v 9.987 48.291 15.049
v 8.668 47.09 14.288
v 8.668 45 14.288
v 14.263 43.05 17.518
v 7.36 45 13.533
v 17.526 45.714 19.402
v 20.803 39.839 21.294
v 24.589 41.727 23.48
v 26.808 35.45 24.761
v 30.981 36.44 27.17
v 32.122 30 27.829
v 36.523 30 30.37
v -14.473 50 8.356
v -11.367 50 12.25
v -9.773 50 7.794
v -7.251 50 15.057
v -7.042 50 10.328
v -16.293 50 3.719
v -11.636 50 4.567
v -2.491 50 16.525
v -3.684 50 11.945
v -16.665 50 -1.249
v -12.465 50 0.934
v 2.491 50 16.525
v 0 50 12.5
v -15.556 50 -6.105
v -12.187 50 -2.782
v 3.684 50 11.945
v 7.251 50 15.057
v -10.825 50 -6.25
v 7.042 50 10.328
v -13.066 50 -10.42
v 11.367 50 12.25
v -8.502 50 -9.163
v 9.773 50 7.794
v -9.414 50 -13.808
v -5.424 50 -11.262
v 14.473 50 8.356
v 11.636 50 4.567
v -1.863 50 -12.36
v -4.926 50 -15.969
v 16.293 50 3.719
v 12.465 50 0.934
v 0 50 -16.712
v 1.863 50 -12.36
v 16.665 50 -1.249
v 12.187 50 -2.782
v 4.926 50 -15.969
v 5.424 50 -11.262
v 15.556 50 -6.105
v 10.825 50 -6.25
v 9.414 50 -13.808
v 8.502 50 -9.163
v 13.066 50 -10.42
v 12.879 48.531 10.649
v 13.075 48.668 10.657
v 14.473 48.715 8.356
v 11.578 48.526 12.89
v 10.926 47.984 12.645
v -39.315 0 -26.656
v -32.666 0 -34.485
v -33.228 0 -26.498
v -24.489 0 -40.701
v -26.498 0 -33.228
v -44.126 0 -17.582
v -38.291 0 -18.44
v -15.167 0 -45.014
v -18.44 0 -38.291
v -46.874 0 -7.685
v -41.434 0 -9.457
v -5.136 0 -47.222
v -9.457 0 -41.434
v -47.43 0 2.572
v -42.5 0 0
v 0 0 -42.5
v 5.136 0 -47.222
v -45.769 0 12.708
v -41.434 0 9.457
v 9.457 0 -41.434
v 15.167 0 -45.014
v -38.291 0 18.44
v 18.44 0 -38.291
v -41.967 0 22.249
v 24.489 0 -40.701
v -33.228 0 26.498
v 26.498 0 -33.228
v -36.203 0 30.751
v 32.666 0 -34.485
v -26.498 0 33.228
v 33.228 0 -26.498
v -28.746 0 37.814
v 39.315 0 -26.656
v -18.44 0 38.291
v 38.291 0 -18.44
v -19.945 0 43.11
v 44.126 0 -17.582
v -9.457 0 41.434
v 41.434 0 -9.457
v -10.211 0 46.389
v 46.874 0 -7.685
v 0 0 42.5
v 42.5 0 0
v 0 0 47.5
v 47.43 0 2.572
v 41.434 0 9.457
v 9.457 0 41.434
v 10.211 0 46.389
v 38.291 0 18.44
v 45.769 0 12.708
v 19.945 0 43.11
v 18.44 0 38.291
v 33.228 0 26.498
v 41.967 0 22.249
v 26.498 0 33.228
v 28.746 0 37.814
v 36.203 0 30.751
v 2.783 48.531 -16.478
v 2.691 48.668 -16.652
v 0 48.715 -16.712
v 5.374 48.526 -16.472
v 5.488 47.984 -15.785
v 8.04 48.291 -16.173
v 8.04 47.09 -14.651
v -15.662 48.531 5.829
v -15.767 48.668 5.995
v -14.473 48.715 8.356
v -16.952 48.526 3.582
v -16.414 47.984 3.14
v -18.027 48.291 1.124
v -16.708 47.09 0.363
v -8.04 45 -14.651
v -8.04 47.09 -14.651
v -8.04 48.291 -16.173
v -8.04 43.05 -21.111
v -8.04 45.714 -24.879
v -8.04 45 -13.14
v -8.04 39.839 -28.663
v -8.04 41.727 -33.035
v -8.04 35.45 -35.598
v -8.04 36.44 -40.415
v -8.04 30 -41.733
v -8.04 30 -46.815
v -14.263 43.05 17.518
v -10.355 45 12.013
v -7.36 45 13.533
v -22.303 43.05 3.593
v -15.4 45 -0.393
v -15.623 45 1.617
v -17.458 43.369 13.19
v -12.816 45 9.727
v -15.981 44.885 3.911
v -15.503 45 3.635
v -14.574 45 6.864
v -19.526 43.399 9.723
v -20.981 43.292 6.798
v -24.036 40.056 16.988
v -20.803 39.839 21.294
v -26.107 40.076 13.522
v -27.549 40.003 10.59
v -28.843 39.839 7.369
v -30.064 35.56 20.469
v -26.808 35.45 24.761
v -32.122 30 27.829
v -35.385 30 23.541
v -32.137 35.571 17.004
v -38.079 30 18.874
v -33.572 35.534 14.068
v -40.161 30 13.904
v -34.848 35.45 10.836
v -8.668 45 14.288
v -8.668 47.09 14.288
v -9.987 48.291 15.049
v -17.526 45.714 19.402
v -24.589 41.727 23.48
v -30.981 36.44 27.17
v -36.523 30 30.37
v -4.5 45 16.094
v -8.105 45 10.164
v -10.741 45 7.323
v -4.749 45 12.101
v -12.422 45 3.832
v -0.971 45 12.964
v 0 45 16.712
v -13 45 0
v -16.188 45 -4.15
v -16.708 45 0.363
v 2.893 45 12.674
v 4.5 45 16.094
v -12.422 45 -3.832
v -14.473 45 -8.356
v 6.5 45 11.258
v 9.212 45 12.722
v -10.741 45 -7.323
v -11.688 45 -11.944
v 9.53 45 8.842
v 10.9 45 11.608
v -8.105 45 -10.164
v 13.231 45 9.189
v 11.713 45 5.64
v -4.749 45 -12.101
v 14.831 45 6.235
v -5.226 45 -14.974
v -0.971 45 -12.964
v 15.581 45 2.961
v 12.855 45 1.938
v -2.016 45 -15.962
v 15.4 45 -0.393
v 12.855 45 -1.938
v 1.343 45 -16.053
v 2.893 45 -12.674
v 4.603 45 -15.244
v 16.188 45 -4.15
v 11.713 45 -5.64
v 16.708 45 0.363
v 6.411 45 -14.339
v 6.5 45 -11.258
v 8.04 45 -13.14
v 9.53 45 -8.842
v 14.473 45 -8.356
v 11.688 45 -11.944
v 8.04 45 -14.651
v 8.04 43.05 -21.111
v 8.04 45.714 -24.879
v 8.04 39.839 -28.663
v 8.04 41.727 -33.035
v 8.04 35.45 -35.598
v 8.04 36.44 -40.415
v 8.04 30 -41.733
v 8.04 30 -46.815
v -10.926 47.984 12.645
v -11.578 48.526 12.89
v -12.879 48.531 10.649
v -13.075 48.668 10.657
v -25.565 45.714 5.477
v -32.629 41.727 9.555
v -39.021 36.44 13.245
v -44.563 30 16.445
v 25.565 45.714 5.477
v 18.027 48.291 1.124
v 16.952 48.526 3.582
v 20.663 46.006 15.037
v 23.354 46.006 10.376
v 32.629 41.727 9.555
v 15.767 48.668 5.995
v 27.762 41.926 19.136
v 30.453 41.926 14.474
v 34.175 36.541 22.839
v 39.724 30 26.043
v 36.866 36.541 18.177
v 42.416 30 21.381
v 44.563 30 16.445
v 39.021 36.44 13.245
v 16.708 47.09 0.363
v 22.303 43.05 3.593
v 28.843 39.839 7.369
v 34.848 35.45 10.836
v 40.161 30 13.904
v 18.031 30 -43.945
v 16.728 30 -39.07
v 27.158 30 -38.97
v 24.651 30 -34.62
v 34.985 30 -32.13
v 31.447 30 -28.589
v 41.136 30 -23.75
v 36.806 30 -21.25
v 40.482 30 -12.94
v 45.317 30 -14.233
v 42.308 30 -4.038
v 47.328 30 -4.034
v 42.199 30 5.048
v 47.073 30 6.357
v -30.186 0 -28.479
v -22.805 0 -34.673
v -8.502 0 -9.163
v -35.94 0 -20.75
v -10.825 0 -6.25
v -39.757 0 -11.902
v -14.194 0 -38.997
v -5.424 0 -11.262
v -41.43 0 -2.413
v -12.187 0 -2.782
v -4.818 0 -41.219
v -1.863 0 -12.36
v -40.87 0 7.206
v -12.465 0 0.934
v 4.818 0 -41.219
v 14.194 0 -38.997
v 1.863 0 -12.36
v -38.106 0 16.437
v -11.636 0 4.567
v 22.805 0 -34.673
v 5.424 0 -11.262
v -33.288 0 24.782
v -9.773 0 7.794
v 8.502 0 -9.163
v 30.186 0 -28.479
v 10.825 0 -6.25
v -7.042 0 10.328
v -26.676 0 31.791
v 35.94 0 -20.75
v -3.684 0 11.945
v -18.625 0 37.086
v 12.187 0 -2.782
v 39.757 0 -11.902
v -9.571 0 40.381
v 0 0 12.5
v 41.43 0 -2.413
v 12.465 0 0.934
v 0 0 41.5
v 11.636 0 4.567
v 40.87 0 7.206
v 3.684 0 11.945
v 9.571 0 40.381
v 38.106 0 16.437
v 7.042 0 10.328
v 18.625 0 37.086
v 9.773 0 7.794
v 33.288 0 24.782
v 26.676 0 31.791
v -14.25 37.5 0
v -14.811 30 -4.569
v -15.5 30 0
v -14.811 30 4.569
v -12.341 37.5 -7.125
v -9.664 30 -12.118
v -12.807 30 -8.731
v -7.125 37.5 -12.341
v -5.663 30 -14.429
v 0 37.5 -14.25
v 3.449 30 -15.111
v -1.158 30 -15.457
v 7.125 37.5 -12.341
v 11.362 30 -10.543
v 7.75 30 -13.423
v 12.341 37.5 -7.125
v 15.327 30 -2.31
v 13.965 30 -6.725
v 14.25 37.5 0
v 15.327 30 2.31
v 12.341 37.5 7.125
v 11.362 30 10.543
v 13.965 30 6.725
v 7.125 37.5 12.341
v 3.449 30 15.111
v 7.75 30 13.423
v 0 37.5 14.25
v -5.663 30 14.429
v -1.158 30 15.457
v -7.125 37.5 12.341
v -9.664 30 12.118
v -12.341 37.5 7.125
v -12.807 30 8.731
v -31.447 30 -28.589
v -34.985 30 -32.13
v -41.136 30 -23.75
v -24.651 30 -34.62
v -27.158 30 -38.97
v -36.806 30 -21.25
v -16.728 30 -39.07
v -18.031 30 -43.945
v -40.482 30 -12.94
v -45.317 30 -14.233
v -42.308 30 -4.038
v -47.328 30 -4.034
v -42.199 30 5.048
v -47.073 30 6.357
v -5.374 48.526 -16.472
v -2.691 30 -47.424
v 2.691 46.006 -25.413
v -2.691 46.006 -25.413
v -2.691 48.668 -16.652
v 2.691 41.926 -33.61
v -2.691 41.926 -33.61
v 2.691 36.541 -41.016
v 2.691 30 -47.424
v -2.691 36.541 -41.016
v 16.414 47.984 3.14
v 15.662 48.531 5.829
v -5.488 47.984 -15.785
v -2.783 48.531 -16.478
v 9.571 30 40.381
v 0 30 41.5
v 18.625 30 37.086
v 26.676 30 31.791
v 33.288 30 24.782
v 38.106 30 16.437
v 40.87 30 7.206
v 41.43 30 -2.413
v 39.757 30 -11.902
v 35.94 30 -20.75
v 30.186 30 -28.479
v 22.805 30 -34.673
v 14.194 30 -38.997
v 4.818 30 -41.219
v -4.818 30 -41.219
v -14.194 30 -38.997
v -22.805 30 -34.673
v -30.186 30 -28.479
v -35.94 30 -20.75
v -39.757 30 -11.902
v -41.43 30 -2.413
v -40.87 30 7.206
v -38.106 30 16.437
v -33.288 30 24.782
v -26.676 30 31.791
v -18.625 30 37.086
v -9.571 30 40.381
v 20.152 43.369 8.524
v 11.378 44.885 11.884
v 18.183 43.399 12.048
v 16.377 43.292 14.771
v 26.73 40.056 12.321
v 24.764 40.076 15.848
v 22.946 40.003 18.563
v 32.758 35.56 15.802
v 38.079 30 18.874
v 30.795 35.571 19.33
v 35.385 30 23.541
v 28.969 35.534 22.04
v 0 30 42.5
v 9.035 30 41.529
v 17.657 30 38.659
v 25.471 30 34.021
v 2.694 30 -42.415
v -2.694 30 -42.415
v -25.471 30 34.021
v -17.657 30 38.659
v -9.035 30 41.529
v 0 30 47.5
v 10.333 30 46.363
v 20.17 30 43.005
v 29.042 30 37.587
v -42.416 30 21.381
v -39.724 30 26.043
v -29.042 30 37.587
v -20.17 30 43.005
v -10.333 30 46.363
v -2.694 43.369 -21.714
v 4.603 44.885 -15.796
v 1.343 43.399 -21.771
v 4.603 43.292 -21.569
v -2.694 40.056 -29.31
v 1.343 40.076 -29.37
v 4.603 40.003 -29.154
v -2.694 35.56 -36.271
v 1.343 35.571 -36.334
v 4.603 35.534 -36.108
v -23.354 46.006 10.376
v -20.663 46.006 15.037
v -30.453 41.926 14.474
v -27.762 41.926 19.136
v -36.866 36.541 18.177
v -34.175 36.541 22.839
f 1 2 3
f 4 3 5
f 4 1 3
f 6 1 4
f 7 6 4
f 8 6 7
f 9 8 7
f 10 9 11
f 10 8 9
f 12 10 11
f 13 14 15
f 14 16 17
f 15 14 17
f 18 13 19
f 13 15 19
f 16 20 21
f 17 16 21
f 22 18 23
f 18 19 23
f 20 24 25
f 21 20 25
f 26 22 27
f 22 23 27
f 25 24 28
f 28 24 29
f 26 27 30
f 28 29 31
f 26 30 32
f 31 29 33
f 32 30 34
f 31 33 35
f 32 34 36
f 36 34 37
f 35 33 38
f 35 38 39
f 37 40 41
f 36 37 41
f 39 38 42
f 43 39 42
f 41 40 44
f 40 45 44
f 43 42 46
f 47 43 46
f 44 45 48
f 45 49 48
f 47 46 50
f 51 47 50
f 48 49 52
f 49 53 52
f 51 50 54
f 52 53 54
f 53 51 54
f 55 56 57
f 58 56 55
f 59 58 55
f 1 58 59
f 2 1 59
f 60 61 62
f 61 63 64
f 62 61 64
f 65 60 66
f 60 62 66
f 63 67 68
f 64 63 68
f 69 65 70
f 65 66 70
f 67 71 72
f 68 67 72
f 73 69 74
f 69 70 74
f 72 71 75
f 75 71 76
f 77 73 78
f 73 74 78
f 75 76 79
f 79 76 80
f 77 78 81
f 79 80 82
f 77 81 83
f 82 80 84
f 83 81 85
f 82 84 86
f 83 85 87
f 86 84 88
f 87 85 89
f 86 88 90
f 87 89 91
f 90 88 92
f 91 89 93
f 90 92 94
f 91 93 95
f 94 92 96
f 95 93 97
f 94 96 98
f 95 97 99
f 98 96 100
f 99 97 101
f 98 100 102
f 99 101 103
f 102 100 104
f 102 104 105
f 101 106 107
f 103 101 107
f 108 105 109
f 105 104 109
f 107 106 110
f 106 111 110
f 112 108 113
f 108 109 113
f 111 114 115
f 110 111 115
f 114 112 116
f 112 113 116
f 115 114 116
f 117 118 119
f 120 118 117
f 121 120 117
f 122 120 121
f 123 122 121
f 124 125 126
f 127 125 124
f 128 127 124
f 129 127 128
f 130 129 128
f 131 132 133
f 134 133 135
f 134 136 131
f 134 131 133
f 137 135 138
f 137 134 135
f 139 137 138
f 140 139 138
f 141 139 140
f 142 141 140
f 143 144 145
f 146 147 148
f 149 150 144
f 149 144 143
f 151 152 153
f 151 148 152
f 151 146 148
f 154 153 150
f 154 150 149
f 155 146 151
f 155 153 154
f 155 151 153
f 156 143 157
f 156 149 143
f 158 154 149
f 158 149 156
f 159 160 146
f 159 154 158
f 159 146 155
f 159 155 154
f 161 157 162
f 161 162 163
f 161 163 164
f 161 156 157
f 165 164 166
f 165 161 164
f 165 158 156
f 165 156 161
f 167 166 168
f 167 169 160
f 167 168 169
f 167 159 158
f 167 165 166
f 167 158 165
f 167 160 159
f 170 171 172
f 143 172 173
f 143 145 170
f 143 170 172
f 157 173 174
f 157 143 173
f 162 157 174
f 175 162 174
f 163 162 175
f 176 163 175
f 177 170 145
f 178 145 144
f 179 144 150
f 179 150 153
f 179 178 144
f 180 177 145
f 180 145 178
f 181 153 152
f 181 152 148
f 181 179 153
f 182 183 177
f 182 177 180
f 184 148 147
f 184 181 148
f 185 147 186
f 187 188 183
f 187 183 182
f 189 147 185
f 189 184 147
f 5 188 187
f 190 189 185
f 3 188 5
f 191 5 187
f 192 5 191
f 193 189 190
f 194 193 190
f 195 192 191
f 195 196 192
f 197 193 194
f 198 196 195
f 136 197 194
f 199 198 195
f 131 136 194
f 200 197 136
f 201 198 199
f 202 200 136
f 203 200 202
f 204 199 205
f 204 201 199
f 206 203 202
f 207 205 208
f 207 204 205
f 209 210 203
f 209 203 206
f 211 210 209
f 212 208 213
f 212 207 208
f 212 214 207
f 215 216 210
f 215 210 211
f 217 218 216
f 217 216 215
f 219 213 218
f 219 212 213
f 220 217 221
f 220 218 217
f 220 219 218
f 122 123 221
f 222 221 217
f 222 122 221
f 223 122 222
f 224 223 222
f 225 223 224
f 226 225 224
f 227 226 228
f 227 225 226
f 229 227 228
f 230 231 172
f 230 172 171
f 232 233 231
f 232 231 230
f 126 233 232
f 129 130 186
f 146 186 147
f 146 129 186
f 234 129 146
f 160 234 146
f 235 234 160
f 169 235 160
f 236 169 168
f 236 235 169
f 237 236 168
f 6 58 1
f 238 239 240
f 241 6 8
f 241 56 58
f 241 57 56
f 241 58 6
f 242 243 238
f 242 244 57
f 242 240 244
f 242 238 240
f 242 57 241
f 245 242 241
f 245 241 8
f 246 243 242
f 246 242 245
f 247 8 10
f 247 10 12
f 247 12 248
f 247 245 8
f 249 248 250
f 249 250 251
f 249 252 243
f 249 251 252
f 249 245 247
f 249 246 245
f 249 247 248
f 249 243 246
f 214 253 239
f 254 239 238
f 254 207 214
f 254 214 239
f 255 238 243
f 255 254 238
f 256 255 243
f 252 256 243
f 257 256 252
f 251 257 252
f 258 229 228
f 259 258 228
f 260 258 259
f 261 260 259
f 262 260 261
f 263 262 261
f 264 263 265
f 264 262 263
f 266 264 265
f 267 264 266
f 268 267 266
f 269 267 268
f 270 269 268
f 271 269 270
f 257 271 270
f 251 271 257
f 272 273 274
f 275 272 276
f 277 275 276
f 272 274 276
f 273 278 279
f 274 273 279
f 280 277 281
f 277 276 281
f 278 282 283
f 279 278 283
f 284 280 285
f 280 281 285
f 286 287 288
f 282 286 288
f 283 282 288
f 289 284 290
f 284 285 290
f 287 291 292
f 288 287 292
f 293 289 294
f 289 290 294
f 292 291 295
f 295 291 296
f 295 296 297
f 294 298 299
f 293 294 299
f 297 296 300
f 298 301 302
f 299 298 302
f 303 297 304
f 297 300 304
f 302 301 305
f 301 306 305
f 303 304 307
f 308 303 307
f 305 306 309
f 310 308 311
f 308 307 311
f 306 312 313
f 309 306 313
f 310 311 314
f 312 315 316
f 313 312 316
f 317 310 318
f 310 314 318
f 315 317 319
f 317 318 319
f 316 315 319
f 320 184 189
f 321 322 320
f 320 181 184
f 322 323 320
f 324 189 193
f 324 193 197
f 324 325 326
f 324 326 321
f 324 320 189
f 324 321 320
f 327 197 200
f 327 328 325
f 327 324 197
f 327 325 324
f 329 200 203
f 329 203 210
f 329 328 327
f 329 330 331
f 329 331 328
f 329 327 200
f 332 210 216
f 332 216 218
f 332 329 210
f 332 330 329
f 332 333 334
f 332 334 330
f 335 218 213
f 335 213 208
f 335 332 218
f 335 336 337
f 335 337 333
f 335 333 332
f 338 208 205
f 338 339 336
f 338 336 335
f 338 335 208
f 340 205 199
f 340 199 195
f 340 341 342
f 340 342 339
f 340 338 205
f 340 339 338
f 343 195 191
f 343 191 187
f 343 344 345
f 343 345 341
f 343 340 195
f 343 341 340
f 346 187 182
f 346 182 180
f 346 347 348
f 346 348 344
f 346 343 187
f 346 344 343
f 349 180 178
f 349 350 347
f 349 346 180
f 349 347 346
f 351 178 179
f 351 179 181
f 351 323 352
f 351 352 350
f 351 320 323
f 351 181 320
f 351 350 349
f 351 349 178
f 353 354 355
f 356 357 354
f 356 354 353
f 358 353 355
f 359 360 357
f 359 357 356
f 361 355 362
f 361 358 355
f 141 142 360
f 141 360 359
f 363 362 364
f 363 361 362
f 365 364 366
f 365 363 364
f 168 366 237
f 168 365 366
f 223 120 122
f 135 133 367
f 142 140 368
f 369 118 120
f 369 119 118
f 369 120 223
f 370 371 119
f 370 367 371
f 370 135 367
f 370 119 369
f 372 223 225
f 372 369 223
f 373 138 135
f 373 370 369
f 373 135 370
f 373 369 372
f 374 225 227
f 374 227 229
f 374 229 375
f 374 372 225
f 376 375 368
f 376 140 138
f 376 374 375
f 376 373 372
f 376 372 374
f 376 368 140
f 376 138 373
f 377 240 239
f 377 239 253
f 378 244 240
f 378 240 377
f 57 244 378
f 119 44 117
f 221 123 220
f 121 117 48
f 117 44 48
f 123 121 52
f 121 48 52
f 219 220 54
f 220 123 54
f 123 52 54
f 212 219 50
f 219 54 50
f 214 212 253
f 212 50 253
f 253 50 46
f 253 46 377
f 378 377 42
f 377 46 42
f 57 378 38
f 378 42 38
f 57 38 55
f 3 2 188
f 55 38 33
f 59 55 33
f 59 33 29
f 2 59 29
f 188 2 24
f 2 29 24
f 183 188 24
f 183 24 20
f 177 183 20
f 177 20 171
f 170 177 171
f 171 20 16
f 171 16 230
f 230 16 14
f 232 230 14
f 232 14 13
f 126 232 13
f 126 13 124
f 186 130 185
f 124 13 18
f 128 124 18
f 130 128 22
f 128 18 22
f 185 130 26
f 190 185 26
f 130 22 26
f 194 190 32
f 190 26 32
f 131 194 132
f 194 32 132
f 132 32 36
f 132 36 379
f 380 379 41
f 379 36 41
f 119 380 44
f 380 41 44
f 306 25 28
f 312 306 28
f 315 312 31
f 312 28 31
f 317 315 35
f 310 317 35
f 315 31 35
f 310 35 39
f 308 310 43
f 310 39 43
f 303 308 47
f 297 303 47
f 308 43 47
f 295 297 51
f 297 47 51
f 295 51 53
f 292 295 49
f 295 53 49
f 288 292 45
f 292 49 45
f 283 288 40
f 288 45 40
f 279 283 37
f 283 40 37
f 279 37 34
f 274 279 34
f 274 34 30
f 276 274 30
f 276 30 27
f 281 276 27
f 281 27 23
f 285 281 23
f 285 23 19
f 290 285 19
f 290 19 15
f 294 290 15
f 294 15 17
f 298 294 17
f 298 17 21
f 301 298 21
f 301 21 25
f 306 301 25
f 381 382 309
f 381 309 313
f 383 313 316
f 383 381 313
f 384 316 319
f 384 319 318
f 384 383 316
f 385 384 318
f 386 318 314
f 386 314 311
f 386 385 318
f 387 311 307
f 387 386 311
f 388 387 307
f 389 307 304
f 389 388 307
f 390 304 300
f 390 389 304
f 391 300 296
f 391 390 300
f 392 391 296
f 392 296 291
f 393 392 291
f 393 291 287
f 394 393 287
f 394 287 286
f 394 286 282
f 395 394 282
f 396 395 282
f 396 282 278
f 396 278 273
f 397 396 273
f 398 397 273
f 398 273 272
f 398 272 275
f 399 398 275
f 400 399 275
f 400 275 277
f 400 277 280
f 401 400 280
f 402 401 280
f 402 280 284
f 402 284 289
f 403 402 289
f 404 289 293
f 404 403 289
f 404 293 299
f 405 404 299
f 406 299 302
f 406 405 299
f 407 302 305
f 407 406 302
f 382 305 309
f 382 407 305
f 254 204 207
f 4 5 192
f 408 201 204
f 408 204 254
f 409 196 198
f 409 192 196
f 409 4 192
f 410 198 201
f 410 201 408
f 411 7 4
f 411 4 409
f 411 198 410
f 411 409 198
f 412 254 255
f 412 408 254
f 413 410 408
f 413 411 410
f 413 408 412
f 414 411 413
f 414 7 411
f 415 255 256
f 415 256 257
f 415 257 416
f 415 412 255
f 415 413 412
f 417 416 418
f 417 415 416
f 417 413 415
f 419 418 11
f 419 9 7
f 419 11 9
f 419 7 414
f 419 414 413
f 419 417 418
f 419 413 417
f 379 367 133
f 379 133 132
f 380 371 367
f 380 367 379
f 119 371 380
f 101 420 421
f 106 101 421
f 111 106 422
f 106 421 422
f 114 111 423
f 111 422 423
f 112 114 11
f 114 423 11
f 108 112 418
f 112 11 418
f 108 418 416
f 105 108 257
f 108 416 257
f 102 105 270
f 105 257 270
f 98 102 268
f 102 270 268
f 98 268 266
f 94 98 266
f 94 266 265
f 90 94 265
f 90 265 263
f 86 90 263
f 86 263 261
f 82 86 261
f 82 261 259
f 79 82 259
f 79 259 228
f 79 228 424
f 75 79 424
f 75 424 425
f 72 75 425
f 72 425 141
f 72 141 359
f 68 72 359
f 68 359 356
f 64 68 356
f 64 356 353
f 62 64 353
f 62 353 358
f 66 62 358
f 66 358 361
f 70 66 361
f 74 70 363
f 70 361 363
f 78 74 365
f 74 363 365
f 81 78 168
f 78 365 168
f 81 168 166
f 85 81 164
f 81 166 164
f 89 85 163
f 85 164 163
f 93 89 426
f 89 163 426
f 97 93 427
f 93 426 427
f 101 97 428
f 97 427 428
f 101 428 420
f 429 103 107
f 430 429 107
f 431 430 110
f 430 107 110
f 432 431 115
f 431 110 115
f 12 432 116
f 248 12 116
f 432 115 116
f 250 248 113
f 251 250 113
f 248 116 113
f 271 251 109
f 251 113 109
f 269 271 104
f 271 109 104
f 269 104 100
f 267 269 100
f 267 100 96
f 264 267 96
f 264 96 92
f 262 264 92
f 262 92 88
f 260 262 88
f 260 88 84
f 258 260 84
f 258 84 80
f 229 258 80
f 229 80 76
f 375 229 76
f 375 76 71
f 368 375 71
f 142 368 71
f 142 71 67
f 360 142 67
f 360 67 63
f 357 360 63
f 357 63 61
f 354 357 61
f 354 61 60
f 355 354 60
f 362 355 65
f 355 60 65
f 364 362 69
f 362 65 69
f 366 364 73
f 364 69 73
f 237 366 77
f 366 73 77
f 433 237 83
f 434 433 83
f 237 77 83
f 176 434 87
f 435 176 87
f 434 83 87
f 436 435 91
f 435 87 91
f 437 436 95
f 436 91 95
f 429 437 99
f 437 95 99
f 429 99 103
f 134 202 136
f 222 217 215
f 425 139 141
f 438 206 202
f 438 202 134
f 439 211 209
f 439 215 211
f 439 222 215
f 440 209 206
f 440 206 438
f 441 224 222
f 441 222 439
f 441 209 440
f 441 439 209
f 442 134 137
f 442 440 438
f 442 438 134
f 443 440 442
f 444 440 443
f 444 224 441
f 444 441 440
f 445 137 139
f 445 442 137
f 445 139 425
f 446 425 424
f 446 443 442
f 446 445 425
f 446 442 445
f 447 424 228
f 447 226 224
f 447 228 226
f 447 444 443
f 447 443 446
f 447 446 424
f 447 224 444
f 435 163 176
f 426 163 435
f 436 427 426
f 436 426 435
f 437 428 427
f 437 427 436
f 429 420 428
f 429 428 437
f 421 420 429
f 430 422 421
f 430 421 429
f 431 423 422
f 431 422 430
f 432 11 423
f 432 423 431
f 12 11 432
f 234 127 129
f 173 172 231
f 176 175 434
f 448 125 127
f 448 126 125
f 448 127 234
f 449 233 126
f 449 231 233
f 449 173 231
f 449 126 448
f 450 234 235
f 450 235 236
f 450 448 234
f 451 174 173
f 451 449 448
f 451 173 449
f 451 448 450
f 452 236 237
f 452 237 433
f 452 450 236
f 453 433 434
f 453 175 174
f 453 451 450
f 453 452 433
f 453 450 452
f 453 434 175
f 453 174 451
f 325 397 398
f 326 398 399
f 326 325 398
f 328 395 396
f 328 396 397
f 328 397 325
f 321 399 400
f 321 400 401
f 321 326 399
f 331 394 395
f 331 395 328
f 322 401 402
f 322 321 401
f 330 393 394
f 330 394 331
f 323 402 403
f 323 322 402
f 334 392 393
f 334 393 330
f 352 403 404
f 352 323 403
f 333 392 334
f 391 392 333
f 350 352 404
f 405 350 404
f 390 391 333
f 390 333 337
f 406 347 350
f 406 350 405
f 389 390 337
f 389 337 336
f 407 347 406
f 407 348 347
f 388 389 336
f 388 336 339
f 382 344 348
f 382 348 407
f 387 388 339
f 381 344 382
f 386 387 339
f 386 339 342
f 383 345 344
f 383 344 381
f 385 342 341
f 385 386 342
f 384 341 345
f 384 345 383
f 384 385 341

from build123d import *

# Parameters (mm, degrees)
SKETCH1_R           = 47.5
BOSS_EXTRUDE1_DEPTH = 30
SKETCH2_R           = 12.5
CUT_EXTRUDE1_DEPTH  = 30
SKETCH3_R           = 42.5
SKETCH3_R_2         = 41.5
CUT_EXTRUDE3_DEPTH  = 74.569694848
SKETCH6_R           = 13
SKETCH5_R           = 15.5
SKETCH9_R           = 12
CUT_EXTRUDE4_DEPTH  = 81.854808144
CIRPATTERN1_COUNT   = 3
SKETCH18_R          = 16.711627315
BOSS_EXTRUDE3_DEPTH = 5
SKETCH19_R          = 12.5
CUT_EXTRUDE5_DEPTH  = 84.740671179


with BuildPart() as part:
    # Sketch1 → Boss-Extrude1 (new body)
    with BuildSketch(Plane(origin=(0, 0, 0), x_dir=(1, 0, 0), z_dir=(0, 1, 0))):
        with Locations(Location((0, 0, 0), (0, 0, 270))):
            Circle(SKETCH1_R)
    extrude(amount=BOSS_EXTRUDE1_DEPTH)

    # Sketch2 → Cut-Extrude1 (cut)
    with BuildSketch(Plane(origin=(0, 30, 0), x_dir=(1, 0, 0), z_dir=(0, 1, 0))):
        with Locations(Location((0, 0, 0), (0, 0, 270))):
            Circle(SKETCH2_R)
    extrude(amount=-CUT_EXTRUDE1_DEPTH, mode=Mode.SUBTRACT)

    # Sketch3 → Cut-Extrude3 (cut, through all)
    with BuildSketch(Plane(origin=(0, 30, 0), x_dir=(1, 0, 0), z_dir=(0, 1, 0))):
        with Locations(Location((0, 0, 0), (0, 0, 270))):
            Circle(SKETCH3_R)
        with Locations(Location((0, 0, 0), (0, 0, 270))):
            Circle(SKETCH3_R_2, mode=Mode.SUBTRACT)
    extrude(amount=-CUT_EXTRUDE3_DEPTH, mode=Mode.SUBTRACT)


with BuildPart() as cut_extrude3_piece_1:
    # of the separate pieces the step leaves, piece 1, a body of its own (cut_extrude3_pieces)
    add(part.part.solids().sort_by_distance((0, 0, 41.5))[0])

    # Sketch6 → Loft1 section 0
    with BuildSketch(Plane(origin=(0, 45, 0), x_dir=(-1, 0, 0), z_dir=(0, -1, 0))):
        Circle(SKETCH6_R)
    # Sketch5 → Loft1 section 1
    with BuildSketch(Plane(origin=(0, 30, 0), x_dir=(1, 0, 0), z_dir=(0, 1, 0))):
        Circle(SKETCH5_R)
    loft()

    # Sketch9 → Cut-Extrude4 (cut, through all)
    with BuildSketch(Plane(origin=(0, 45, 0), x_dir=(1, 0, 0), z_dir=(0, 1, 0))):
        with Locations(Location((0, 0, 0), (0, 0, 270))):
            Circle(SKETCH9_R)
    extrude(amount=-CUT_EXTRUDE4_DEPTH, mode=Mode.SUBTRACT)



with BuildPart() as cut_extrude3_piece_2:
    # of the separate pieces the step leaves, piece 2, a body of its own (cut_extrude3_pieces)
    add(part.part.solids().sort_by_distance((0, 0, 47.5))[0])

    # Sweep1: sweep along a path in Sketch13
    with BuildLine(Plane(origin=(0, 0, 0), x_dir=(0, 0, -1), z_dir=(1, 0, 0))) as sweep1_path:
        ThreePointArc((12, 45), (28.013623807, 39.985126821), (41.5, 30))
    # Sketch10 → Sweep1 (sweep)
    with BuildSketch(Plane(origin=(0, 30, 0), x_dir=(1, 0, 0), z_dir=(0, 1, 0))):
        with BuildLine():
            Line((8.039798927, 41.732620733), (8.039798927, 46.814651907))
            ThreePointArc((8.039798927, 46.814651907), (0, 47.5), (-8.039798927, 46.814651907))
            Line((-8.039798927, 46.814651907), (-8.039798927, 41.732620733))
            ThreePointArc((-8.039798927, 41.732620733), (0, 42.5), (8.039798927, 41.732620733))
        make_face()
    sweep1 = sweep(path=sweep1_path.line)

    # CirPattern1: Sweep1 ×3 about axis
    cirpattern1_axis = Axis((0, 30, 0), (0, 1, 0))
    for i in range(1, CIRPATTERN1_COUNT):
        add(sweep1.rotate(cirpattern1_axis, i * 360 / CIRPATTERN1_COUNT))


with BuildPart() as cut_extrude3_piece_1_1:
    add(cut_extrude3_piece_1.part)

    add(cut_extrude3_piece_2.part)  # Boss-Extrude3 merges Cut-Extrude3 piece 2
    # Sketch18 → Boss-Extrude3 (add)
    with BuildSketch(Plane(origin=(0, 50, 0), x_dir=(-1, 0, 0), z_dir=(0, -1, 0))):
        with Locations(Location((0, 0, 0), (0, 0, 90))):
            Circle(SKETCH18_R)
    extrude(amount=BOSS_EXTRUDE3_DEPTH)

    # Sketch19 → Cut-Extrude5 (cut, through all)
    with BuildSketch(Plane(origin=(0, 50, 0), x_dir=(1, 0, 0), z_dir=(0, 1, 0))):
        with Locations(Location((0, 0, 0), (0, 0, 270))):
            Circle(SKETCH19_R)
    extrude(amount=-CUT_EXTRUDE5_DEPTH, mode=Mode.SUBTRACT)


solid = cut_extrude3_piece_1_1.part
